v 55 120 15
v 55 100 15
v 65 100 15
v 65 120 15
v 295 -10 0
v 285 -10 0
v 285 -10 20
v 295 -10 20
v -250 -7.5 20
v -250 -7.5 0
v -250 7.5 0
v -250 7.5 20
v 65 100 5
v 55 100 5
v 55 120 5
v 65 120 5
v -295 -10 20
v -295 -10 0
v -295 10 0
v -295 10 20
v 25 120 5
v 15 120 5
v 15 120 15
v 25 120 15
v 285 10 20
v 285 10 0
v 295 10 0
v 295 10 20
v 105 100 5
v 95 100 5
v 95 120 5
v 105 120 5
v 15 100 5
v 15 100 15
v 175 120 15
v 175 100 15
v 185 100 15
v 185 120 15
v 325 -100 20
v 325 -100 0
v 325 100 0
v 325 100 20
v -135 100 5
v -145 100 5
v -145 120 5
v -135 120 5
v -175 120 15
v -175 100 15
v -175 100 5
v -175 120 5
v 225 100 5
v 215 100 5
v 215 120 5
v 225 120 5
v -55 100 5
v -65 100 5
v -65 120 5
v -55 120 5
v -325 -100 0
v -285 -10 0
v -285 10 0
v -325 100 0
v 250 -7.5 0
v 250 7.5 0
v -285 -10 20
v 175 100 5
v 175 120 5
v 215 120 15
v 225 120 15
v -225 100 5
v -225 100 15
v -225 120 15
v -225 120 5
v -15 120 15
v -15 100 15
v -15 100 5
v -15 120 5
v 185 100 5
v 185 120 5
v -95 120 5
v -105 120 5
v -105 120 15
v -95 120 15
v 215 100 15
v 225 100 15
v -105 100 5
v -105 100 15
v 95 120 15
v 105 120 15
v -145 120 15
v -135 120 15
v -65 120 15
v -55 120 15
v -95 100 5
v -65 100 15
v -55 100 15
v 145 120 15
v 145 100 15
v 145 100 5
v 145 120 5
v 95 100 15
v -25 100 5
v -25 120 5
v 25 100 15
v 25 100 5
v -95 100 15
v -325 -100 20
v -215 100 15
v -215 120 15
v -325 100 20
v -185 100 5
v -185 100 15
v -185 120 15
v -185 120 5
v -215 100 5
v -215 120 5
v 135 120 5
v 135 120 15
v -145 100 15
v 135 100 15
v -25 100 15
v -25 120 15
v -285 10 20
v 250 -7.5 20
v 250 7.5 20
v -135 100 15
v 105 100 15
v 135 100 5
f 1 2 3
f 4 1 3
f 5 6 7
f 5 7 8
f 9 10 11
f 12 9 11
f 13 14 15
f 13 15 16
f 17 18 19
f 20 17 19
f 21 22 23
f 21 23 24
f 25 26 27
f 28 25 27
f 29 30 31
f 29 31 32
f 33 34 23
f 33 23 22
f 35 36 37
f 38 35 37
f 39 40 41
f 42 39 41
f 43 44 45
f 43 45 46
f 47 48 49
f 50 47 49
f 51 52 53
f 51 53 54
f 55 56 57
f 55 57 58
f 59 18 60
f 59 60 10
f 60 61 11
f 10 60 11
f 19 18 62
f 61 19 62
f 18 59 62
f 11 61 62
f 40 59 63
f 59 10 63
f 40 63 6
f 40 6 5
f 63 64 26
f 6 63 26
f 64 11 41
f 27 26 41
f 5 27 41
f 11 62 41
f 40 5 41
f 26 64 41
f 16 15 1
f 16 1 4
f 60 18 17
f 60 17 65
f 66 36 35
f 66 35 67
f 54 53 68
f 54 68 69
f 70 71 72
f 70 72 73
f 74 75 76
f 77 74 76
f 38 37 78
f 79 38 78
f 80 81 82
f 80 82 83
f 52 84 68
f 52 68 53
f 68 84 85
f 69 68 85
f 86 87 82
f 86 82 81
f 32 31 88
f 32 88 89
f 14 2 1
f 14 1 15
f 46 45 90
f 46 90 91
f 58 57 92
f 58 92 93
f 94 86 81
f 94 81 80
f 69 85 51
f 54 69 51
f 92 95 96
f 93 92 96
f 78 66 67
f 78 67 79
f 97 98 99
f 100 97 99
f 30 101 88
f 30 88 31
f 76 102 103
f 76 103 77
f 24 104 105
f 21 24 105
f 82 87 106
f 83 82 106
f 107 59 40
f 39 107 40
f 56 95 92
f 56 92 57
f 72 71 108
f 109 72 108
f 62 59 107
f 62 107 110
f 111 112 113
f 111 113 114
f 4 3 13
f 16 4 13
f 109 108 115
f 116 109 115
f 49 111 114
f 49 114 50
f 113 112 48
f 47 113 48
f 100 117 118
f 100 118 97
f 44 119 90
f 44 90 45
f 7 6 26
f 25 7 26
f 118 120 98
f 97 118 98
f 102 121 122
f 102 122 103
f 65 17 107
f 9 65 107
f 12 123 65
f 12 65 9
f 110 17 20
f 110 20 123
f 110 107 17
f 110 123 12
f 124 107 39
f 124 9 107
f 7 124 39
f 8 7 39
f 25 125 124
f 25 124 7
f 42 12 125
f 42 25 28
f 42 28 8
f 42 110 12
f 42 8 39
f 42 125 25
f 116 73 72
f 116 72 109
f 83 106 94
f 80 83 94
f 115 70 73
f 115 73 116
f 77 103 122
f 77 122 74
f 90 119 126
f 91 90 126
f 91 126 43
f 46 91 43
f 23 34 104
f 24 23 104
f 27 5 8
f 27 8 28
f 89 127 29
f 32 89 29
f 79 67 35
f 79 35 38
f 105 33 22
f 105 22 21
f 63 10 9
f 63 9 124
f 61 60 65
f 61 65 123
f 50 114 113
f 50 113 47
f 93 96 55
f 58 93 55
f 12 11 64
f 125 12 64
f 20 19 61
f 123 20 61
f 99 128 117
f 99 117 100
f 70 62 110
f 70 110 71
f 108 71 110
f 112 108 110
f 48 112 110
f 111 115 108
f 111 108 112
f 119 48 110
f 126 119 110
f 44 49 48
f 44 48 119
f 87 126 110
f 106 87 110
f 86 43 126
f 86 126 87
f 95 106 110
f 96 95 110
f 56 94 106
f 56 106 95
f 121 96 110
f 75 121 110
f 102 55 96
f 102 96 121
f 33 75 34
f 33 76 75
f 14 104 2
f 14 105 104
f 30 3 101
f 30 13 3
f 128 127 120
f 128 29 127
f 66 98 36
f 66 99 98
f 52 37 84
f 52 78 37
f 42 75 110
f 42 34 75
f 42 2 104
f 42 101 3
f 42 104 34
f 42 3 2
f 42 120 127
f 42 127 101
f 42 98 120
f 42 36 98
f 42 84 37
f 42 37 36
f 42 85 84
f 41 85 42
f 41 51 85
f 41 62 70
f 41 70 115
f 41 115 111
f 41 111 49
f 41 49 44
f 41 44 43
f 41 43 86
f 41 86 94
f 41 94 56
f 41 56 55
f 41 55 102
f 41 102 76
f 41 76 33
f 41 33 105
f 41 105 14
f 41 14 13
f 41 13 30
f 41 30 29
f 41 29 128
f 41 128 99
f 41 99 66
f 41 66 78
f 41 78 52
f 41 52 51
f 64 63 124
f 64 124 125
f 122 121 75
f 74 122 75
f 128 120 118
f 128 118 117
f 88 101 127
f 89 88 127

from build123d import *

# Parameters (mm, degrees)
SKETCH1_W           = 650
SKETCH1_H           = 200
SKETCH1_W_2         = 500
SKETCH1_H_2         = 15
SKETCH1_W_3         = 10
SKETCH1_H_3         = 20
BOSS_EXTRUDE1_DEPTH = 20
SKETCH2_W           = 10
SKETCH2_H           = 10
BOSS_EXTRUDE2_DEPTH = 20


with BuildPart() as part:
    # Sketch1 → Boss-Extrude1 (new body)
    with BuildSketch(Plane.XY):
        Rectangle(SKETCH1_W, SKETCH1_H)
        Rectangle(SKETCH1_W_2, SKETCH1_H_2, mode=Mode.SUBTRACT)
        with Locations((-290, 0)):
            Rectangle(SKETCH1_W_3, SKETCH1_H_3, mode=Mode.SUBTRACT)
        with Locations((290, 0)):
            Rectangle(SKETCH1_W_3, SKETCH1_H_3, mode=Mode.SUBTRACT)
    extrude(amount=BOSS_EXTRUDE1_DEPTH)

    # Sketch2 → Boss-Extrude2 (add)
    with BuildSketch(Plane(origin=(0, 100, 0), x_dir=(1, 0, 0), z_dir=(0, 1, 0))):
        with Locations((-180, -10)):
            Rectangle(SKETCH2_W, SKETCH2_H)
        with Locations((-220, -10)):
            Rectangle(SKETCH2_W, SKETCH2_H)
        with Locations((-140, -10)):
            Rectangle(SKETCH2_W, SKETCH2_H)
        with Locations((-100, -10)):
            Rectangle(SKETCH2_W, SKETCH2_H)
        with Locations((-60, -10)):
            Rectangle(SKETCH2_W, SKETCH2_H)
        with Locations((-20, -10)):
            Rectangle(SKETCH2_W, SKETCH2_H)
        with Locations((20, -10)):
            Rectangle(SKETCH2_W, SKETCH2_H)
        with Locations((60, -10)):
            Rectangle(SKETCH2_W, SKETCH2_H)
        with Locations((100, -10)):
            Rectangle(SKETCH2_W, SKETCH2_H)
        with Locations((140, -10)):
            Rectangle(SKETCH2_W, SKETCH2_H)
        with Locations((180, -10)):
            Rectangle(SKETCH2_W, SKETCH2_H)
        with Locations((220, -10)):
            Rectangle(SKETCH2_W, SKETCH2_H)
    extrude(amount=BOSS_EXTRUDE2_DEPTH)


solid = part.part
